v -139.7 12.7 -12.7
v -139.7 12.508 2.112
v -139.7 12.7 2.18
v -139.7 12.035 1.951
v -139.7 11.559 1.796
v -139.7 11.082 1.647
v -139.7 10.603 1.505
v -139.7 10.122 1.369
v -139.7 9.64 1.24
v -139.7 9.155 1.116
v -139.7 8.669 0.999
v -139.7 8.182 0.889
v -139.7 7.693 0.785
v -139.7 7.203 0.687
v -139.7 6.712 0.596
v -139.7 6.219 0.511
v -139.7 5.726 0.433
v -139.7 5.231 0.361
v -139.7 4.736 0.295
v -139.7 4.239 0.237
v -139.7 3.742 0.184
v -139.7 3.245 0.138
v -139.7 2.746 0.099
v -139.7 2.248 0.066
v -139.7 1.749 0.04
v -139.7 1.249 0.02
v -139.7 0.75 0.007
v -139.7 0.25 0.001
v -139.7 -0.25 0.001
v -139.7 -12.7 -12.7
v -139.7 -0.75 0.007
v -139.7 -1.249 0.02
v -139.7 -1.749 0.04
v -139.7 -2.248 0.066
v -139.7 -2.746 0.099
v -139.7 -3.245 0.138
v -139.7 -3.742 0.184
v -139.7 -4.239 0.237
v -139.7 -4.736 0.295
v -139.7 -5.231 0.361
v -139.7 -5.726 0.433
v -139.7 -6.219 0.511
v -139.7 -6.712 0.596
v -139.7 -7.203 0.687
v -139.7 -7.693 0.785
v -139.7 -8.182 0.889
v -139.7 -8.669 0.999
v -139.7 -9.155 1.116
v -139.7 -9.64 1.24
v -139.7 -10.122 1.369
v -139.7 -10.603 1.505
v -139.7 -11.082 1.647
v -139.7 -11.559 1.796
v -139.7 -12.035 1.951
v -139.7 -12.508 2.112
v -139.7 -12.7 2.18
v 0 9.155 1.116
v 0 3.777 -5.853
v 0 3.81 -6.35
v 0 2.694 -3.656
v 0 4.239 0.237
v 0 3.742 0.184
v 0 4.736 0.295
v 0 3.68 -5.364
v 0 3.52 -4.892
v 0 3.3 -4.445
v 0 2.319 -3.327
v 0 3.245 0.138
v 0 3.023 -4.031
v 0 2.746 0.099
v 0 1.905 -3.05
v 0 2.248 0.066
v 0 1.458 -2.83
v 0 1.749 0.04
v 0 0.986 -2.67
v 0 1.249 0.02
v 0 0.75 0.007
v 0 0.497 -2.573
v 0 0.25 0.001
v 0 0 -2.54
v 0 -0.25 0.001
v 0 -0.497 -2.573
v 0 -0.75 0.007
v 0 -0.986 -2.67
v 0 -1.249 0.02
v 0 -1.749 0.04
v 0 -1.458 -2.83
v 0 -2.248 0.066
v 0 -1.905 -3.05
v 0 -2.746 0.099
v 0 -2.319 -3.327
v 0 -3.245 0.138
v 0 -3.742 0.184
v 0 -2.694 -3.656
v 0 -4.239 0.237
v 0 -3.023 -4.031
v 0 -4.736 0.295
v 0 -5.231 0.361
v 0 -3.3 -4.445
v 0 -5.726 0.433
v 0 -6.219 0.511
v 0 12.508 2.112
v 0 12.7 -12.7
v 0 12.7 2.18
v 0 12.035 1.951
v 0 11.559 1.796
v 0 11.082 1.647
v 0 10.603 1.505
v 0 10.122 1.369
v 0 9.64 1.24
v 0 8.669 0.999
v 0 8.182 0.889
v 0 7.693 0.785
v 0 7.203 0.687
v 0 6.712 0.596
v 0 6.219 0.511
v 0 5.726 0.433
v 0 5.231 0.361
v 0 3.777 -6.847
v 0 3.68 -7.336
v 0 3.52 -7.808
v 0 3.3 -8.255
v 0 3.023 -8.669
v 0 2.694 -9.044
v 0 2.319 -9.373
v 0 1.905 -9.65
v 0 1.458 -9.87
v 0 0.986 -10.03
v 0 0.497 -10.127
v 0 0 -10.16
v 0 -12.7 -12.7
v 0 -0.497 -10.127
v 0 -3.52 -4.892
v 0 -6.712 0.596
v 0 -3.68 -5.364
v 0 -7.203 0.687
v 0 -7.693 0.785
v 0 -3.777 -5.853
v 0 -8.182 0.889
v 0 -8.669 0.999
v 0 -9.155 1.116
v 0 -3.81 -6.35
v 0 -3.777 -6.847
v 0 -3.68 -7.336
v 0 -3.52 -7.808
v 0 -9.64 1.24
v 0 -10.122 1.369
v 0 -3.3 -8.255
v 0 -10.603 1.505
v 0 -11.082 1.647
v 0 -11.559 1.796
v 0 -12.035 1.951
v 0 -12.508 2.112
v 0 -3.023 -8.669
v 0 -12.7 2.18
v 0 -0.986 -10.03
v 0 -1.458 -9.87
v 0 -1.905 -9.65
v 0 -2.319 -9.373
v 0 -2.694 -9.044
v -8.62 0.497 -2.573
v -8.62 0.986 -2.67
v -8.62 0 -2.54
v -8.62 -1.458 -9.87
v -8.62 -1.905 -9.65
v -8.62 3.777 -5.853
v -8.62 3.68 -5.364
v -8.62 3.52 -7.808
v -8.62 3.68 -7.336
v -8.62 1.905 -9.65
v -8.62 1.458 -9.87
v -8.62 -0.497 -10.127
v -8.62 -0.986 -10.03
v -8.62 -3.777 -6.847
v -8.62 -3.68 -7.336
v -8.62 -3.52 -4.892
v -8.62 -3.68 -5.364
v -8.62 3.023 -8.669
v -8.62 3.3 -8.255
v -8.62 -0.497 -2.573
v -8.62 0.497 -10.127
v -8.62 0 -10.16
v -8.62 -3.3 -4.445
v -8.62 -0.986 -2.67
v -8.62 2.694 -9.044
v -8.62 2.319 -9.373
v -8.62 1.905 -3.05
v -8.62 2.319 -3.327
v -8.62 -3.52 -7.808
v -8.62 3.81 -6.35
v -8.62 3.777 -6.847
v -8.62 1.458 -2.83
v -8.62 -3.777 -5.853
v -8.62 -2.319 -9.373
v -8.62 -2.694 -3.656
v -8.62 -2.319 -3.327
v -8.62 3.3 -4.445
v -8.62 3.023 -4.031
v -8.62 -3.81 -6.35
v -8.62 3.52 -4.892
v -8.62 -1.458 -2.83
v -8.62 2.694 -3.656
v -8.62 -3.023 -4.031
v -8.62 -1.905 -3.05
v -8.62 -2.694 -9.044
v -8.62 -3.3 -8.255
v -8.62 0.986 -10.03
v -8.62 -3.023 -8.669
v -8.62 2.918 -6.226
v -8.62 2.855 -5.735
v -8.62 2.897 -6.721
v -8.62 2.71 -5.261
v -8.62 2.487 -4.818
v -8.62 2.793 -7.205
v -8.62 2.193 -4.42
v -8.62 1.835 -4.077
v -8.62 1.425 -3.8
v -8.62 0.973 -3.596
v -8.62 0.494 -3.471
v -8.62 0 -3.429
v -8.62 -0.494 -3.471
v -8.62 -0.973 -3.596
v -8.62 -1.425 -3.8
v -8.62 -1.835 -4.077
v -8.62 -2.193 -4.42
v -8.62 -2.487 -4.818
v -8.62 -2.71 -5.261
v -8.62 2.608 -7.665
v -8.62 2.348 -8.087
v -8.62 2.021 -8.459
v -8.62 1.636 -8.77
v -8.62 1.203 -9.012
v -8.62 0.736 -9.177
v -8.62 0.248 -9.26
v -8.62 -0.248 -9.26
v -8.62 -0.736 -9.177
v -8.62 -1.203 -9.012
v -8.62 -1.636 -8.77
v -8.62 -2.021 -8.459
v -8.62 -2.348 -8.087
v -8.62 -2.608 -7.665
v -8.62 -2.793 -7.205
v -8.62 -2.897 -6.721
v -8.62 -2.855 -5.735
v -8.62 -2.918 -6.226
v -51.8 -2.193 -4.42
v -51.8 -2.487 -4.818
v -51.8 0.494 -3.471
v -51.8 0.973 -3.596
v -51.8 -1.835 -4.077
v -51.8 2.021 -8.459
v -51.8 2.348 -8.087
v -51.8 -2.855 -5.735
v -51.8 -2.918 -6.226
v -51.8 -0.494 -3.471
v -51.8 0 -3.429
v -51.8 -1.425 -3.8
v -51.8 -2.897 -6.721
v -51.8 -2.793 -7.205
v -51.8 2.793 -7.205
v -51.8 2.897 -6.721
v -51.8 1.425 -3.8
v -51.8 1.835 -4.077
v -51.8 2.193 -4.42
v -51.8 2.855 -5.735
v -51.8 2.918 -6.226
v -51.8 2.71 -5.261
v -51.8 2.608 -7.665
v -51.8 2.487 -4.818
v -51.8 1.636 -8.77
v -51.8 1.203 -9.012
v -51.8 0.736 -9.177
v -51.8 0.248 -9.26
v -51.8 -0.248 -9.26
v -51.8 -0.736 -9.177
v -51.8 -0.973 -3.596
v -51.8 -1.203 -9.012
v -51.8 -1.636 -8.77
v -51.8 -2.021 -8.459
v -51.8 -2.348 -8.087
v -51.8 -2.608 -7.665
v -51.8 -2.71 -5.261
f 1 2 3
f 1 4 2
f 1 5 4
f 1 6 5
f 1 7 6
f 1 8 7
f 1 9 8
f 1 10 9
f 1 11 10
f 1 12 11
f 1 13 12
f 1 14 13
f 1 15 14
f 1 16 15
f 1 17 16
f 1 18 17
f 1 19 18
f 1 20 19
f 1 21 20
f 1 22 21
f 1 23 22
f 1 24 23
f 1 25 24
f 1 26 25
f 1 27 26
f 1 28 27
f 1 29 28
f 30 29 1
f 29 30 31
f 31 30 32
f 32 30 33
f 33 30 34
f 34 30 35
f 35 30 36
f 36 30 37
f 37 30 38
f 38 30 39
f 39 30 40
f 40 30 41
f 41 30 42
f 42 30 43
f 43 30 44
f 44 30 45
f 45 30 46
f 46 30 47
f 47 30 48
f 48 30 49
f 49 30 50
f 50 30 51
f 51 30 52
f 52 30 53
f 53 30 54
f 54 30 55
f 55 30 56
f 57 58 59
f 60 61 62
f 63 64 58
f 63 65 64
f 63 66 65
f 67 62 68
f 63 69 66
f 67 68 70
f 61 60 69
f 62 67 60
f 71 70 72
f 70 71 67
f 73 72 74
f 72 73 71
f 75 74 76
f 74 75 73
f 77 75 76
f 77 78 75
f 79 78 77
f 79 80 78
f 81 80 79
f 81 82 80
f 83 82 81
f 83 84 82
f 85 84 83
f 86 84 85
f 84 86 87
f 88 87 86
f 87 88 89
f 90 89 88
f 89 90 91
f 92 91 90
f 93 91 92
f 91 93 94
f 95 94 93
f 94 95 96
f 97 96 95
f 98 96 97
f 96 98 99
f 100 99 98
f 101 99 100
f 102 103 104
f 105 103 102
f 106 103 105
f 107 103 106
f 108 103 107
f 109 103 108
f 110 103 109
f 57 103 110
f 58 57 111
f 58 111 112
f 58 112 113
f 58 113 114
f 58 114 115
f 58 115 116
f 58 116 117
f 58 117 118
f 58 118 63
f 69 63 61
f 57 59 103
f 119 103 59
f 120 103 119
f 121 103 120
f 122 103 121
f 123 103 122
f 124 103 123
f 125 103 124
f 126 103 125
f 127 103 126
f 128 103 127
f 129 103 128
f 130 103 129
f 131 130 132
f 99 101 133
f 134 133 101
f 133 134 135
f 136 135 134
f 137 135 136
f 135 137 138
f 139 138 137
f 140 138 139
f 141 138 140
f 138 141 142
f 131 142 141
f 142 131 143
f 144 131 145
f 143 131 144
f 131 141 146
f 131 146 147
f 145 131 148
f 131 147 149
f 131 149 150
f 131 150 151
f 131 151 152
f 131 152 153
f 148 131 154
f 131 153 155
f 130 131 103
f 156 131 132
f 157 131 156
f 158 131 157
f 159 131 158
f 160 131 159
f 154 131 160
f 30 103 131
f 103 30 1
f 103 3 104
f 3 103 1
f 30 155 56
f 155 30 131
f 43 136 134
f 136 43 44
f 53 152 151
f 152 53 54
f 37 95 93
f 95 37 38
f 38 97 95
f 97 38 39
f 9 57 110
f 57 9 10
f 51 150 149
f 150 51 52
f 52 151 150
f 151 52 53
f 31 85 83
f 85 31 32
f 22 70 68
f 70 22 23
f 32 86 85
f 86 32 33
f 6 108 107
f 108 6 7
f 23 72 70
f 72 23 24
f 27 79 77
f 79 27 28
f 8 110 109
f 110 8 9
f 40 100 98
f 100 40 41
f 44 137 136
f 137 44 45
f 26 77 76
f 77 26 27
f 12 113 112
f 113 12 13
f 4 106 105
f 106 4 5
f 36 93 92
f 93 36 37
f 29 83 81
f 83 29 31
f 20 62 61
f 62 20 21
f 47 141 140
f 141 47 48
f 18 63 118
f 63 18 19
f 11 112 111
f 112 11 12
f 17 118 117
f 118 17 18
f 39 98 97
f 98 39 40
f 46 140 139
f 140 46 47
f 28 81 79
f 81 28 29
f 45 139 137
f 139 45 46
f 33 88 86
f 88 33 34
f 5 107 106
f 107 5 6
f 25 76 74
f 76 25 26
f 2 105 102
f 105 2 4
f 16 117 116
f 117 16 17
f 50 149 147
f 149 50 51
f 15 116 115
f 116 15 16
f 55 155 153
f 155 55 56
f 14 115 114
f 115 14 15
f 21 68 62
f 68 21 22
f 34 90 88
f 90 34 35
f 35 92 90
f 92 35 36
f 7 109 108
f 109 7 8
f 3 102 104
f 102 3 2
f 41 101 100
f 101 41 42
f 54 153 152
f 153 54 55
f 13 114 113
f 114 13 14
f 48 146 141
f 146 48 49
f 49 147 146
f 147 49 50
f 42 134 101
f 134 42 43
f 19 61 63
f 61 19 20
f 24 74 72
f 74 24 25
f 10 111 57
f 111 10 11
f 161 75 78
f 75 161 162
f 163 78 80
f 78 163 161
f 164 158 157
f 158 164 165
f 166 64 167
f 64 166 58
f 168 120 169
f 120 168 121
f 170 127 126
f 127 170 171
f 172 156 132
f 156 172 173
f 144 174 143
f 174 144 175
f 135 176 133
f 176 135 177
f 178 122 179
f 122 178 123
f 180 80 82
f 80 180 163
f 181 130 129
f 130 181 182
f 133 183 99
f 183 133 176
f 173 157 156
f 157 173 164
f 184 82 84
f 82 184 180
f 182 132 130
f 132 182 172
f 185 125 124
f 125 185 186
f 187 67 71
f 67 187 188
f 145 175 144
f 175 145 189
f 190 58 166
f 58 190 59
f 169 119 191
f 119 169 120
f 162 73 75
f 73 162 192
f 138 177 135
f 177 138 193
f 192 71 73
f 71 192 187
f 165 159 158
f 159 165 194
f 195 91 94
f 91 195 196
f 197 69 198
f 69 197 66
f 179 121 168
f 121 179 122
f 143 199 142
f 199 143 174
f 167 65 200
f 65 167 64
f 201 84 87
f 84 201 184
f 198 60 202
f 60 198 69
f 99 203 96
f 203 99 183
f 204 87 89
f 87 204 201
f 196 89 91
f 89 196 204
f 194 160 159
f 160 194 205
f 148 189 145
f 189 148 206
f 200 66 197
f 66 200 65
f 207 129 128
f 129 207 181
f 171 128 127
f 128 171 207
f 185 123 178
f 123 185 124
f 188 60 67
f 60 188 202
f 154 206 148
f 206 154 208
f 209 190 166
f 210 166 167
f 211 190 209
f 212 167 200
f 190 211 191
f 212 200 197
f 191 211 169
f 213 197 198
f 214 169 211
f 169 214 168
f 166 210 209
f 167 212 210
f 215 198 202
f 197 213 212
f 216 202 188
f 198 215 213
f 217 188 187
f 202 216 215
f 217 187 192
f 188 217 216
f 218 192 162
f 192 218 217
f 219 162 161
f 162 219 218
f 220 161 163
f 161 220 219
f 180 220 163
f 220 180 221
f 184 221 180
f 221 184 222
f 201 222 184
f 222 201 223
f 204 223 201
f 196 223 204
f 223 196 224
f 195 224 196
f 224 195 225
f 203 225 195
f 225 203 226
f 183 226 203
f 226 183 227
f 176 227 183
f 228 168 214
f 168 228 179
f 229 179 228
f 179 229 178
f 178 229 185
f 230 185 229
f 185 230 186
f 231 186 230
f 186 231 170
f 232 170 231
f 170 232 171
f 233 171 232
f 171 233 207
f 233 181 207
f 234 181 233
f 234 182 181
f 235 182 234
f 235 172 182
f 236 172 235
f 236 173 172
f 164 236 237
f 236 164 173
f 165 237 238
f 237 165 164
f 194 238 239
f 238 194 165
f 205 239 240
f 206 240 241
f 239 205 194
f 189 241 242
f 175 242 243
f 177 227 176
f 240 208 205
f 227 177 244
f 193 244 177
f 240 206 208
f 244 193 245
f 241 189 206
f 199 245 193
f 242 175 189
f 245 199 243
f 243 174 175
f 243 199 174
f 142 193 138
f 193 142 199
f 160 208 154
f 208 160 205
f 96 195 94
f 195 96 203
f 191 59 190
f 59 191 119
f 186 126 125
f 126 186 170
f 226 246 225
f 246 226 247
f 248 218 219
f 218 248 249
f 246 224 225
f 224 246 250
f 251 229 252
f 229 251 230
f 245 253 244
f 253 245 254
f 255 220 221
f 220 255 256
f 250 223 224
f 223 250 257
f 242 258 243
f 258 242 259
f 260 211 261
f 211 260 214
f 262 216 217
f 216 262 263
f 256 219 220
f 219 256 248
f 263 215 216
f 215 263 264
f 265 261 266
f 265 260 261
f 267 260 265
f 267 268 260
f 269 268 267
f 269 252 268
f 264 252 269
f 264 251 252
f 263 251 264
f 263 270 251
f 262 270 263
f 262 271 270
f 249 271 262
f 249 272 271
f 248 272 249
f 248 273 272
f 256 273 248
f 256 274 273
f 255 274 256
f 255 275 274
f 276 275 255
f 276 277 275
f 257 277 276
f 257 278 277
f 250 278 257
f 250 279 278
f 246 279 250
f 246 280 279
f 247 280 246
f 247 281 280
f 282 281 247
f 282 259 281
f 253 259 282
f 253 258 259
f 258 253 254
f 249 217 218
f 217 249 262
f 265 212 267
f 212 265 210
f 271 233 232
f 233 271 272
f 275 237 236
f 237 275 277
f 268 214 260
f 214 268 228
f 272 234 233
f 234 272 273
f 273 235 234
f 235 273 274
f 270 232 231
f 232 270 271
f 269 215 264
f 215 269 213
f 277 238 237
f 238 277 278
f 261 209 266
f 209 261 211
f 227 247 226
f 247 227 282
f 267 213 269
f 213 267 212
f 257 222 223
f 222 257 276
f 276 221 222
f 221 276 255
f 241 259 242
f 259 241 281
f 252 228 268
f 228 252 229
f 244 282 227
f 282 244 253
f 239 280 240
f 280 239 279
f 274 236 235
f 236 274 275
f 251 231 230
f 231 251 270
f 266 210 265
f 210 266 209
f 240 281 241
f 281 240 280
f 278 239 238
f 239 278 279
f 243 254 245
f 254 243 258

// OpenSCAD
$fa=0.5; // default minimum facet angle
$fs=0.5; // default minimum facet size

inch = 25.4;

column_w = 1 * inch;
column_h = 5.5 * inch;
cut_d = 3 * inch;

base_d = 0 * inch;
base_h = 3;

hole_bottom_d = 0.3 * inch;
hole_bottom_h = 0.3 * inch;

hole_top_d = 0.23 * inch;
hole_top_h = 2 * inch;

diff = (column_w) / 4;

rotate([0, -90, 0])
difference() {
    union() {
    //    translate([-diff, 0, -peg_h]) cylinder(d = peg_d, h=peg_h);
        translate([0, 0, column_h/2]) 
        difference() {
            cube([column_w, column_w, column_h], center = true);
            translate([cut_d/2, 0, -column_h/2-1]) cylinder(d = cut_d, h=column_h+2);
        }
        translate([-diff, 0, 0]) cylinder(d = base_d, h=base_h);
    }
    translate([-diff, 0, -1]) cylinder(d = hole_bottom_d, h=hole_bottom_h + 2);
    translate([-diff, 0, -1]) cylinder(d = hole_top_d, h=hole_top_h + 2);
}
